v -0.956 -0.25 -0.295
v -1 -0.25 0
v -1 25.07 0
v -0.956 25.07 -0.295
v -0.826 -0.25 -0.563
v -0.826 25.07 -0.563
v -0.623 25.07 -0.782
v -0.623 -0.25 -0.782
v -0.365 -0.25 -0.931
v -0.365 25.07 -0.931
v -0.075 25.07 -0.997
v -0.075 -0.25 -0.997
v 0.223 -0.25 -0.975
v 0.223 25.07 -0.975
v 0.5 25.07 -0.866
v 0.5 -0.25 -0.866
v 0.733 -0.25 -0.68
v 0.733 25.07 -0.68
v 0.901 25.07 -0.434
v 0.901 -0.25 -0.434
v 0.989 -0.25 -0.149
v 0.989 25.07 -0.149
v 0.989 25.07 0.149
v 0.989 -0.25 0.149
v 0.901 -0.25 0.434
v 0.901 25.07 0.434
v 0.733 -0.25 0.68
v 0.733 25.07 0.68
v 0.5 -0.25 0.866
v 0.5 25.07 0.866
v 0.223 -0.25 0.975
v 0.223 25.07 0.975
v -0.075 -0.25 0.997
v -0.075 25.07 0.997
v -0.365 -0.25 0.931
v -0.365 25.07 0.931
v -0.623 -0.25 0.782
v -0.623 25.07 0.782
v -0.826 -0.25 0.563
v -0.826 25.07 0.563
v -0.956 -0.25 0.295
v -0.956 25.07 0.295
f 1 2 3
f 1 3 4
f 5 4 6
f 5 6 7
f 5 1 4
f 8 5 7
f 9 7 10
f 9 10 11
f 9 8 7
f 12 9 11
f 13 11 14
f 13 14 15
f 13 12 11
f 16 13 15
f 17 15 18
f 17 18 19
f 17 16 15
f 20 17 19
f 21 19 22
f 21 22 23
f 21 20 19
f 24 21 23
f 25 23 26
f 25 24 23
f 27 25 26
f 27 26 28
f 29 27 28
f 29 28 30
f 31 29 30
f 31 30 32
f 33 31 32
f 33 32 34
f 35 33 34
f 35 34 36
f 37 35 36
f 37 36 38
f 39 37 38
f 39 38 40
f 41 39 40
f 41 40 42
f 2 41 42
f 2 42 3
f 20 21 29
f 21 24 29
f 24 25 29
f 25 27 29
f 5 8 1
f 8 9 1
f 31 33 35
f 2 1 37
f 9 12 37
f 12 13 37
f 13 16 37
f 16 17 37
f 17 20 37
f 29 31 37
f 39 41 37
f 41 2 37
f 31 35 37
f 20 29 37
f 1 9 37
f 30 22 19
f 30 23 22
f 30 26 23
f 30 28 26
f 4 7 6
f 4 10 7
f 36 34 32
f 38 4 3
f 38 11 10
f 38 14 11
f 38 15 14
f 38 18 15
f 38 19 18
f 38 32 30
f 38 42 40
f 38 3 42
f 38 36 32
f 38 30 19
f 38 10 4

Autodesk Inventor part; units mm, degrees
ref_plane "YZ Plane" through (0, 0, 0) normal (1, 0, 0) x (0, 1, 0)
ref_plane "XZ Plane" through (0, 0, 0) normal (0, 1, 0) x (-1, 0, 0)
ref_plane "XY Plane" through (0, 0, 0) normal (0, 0, 1) x (1, 0, 0)
sketch "Sketch1" plane through (0, 0, 0) normal (0, 1, 0) x (-1, 0, 0)
  circle A0 centre (0, 0) radius 1
  dimension "d0" = 2
extrude "Extrusion1" add sketch "Sketch1" along normal blind 26
ref_plane "Work Plane1" through (0, -30, 0) normal (0, -1, 0) x (1, 0, 0)
move faces "Move1" translate (0, -0.25, 0) faces at (-0.5848, 0, -0.397)
move faces "Move2" translate (0, -0.93, 0) faces at (-0.2495, 26, 0.221)
properties part number "LOOP2_COLL"
